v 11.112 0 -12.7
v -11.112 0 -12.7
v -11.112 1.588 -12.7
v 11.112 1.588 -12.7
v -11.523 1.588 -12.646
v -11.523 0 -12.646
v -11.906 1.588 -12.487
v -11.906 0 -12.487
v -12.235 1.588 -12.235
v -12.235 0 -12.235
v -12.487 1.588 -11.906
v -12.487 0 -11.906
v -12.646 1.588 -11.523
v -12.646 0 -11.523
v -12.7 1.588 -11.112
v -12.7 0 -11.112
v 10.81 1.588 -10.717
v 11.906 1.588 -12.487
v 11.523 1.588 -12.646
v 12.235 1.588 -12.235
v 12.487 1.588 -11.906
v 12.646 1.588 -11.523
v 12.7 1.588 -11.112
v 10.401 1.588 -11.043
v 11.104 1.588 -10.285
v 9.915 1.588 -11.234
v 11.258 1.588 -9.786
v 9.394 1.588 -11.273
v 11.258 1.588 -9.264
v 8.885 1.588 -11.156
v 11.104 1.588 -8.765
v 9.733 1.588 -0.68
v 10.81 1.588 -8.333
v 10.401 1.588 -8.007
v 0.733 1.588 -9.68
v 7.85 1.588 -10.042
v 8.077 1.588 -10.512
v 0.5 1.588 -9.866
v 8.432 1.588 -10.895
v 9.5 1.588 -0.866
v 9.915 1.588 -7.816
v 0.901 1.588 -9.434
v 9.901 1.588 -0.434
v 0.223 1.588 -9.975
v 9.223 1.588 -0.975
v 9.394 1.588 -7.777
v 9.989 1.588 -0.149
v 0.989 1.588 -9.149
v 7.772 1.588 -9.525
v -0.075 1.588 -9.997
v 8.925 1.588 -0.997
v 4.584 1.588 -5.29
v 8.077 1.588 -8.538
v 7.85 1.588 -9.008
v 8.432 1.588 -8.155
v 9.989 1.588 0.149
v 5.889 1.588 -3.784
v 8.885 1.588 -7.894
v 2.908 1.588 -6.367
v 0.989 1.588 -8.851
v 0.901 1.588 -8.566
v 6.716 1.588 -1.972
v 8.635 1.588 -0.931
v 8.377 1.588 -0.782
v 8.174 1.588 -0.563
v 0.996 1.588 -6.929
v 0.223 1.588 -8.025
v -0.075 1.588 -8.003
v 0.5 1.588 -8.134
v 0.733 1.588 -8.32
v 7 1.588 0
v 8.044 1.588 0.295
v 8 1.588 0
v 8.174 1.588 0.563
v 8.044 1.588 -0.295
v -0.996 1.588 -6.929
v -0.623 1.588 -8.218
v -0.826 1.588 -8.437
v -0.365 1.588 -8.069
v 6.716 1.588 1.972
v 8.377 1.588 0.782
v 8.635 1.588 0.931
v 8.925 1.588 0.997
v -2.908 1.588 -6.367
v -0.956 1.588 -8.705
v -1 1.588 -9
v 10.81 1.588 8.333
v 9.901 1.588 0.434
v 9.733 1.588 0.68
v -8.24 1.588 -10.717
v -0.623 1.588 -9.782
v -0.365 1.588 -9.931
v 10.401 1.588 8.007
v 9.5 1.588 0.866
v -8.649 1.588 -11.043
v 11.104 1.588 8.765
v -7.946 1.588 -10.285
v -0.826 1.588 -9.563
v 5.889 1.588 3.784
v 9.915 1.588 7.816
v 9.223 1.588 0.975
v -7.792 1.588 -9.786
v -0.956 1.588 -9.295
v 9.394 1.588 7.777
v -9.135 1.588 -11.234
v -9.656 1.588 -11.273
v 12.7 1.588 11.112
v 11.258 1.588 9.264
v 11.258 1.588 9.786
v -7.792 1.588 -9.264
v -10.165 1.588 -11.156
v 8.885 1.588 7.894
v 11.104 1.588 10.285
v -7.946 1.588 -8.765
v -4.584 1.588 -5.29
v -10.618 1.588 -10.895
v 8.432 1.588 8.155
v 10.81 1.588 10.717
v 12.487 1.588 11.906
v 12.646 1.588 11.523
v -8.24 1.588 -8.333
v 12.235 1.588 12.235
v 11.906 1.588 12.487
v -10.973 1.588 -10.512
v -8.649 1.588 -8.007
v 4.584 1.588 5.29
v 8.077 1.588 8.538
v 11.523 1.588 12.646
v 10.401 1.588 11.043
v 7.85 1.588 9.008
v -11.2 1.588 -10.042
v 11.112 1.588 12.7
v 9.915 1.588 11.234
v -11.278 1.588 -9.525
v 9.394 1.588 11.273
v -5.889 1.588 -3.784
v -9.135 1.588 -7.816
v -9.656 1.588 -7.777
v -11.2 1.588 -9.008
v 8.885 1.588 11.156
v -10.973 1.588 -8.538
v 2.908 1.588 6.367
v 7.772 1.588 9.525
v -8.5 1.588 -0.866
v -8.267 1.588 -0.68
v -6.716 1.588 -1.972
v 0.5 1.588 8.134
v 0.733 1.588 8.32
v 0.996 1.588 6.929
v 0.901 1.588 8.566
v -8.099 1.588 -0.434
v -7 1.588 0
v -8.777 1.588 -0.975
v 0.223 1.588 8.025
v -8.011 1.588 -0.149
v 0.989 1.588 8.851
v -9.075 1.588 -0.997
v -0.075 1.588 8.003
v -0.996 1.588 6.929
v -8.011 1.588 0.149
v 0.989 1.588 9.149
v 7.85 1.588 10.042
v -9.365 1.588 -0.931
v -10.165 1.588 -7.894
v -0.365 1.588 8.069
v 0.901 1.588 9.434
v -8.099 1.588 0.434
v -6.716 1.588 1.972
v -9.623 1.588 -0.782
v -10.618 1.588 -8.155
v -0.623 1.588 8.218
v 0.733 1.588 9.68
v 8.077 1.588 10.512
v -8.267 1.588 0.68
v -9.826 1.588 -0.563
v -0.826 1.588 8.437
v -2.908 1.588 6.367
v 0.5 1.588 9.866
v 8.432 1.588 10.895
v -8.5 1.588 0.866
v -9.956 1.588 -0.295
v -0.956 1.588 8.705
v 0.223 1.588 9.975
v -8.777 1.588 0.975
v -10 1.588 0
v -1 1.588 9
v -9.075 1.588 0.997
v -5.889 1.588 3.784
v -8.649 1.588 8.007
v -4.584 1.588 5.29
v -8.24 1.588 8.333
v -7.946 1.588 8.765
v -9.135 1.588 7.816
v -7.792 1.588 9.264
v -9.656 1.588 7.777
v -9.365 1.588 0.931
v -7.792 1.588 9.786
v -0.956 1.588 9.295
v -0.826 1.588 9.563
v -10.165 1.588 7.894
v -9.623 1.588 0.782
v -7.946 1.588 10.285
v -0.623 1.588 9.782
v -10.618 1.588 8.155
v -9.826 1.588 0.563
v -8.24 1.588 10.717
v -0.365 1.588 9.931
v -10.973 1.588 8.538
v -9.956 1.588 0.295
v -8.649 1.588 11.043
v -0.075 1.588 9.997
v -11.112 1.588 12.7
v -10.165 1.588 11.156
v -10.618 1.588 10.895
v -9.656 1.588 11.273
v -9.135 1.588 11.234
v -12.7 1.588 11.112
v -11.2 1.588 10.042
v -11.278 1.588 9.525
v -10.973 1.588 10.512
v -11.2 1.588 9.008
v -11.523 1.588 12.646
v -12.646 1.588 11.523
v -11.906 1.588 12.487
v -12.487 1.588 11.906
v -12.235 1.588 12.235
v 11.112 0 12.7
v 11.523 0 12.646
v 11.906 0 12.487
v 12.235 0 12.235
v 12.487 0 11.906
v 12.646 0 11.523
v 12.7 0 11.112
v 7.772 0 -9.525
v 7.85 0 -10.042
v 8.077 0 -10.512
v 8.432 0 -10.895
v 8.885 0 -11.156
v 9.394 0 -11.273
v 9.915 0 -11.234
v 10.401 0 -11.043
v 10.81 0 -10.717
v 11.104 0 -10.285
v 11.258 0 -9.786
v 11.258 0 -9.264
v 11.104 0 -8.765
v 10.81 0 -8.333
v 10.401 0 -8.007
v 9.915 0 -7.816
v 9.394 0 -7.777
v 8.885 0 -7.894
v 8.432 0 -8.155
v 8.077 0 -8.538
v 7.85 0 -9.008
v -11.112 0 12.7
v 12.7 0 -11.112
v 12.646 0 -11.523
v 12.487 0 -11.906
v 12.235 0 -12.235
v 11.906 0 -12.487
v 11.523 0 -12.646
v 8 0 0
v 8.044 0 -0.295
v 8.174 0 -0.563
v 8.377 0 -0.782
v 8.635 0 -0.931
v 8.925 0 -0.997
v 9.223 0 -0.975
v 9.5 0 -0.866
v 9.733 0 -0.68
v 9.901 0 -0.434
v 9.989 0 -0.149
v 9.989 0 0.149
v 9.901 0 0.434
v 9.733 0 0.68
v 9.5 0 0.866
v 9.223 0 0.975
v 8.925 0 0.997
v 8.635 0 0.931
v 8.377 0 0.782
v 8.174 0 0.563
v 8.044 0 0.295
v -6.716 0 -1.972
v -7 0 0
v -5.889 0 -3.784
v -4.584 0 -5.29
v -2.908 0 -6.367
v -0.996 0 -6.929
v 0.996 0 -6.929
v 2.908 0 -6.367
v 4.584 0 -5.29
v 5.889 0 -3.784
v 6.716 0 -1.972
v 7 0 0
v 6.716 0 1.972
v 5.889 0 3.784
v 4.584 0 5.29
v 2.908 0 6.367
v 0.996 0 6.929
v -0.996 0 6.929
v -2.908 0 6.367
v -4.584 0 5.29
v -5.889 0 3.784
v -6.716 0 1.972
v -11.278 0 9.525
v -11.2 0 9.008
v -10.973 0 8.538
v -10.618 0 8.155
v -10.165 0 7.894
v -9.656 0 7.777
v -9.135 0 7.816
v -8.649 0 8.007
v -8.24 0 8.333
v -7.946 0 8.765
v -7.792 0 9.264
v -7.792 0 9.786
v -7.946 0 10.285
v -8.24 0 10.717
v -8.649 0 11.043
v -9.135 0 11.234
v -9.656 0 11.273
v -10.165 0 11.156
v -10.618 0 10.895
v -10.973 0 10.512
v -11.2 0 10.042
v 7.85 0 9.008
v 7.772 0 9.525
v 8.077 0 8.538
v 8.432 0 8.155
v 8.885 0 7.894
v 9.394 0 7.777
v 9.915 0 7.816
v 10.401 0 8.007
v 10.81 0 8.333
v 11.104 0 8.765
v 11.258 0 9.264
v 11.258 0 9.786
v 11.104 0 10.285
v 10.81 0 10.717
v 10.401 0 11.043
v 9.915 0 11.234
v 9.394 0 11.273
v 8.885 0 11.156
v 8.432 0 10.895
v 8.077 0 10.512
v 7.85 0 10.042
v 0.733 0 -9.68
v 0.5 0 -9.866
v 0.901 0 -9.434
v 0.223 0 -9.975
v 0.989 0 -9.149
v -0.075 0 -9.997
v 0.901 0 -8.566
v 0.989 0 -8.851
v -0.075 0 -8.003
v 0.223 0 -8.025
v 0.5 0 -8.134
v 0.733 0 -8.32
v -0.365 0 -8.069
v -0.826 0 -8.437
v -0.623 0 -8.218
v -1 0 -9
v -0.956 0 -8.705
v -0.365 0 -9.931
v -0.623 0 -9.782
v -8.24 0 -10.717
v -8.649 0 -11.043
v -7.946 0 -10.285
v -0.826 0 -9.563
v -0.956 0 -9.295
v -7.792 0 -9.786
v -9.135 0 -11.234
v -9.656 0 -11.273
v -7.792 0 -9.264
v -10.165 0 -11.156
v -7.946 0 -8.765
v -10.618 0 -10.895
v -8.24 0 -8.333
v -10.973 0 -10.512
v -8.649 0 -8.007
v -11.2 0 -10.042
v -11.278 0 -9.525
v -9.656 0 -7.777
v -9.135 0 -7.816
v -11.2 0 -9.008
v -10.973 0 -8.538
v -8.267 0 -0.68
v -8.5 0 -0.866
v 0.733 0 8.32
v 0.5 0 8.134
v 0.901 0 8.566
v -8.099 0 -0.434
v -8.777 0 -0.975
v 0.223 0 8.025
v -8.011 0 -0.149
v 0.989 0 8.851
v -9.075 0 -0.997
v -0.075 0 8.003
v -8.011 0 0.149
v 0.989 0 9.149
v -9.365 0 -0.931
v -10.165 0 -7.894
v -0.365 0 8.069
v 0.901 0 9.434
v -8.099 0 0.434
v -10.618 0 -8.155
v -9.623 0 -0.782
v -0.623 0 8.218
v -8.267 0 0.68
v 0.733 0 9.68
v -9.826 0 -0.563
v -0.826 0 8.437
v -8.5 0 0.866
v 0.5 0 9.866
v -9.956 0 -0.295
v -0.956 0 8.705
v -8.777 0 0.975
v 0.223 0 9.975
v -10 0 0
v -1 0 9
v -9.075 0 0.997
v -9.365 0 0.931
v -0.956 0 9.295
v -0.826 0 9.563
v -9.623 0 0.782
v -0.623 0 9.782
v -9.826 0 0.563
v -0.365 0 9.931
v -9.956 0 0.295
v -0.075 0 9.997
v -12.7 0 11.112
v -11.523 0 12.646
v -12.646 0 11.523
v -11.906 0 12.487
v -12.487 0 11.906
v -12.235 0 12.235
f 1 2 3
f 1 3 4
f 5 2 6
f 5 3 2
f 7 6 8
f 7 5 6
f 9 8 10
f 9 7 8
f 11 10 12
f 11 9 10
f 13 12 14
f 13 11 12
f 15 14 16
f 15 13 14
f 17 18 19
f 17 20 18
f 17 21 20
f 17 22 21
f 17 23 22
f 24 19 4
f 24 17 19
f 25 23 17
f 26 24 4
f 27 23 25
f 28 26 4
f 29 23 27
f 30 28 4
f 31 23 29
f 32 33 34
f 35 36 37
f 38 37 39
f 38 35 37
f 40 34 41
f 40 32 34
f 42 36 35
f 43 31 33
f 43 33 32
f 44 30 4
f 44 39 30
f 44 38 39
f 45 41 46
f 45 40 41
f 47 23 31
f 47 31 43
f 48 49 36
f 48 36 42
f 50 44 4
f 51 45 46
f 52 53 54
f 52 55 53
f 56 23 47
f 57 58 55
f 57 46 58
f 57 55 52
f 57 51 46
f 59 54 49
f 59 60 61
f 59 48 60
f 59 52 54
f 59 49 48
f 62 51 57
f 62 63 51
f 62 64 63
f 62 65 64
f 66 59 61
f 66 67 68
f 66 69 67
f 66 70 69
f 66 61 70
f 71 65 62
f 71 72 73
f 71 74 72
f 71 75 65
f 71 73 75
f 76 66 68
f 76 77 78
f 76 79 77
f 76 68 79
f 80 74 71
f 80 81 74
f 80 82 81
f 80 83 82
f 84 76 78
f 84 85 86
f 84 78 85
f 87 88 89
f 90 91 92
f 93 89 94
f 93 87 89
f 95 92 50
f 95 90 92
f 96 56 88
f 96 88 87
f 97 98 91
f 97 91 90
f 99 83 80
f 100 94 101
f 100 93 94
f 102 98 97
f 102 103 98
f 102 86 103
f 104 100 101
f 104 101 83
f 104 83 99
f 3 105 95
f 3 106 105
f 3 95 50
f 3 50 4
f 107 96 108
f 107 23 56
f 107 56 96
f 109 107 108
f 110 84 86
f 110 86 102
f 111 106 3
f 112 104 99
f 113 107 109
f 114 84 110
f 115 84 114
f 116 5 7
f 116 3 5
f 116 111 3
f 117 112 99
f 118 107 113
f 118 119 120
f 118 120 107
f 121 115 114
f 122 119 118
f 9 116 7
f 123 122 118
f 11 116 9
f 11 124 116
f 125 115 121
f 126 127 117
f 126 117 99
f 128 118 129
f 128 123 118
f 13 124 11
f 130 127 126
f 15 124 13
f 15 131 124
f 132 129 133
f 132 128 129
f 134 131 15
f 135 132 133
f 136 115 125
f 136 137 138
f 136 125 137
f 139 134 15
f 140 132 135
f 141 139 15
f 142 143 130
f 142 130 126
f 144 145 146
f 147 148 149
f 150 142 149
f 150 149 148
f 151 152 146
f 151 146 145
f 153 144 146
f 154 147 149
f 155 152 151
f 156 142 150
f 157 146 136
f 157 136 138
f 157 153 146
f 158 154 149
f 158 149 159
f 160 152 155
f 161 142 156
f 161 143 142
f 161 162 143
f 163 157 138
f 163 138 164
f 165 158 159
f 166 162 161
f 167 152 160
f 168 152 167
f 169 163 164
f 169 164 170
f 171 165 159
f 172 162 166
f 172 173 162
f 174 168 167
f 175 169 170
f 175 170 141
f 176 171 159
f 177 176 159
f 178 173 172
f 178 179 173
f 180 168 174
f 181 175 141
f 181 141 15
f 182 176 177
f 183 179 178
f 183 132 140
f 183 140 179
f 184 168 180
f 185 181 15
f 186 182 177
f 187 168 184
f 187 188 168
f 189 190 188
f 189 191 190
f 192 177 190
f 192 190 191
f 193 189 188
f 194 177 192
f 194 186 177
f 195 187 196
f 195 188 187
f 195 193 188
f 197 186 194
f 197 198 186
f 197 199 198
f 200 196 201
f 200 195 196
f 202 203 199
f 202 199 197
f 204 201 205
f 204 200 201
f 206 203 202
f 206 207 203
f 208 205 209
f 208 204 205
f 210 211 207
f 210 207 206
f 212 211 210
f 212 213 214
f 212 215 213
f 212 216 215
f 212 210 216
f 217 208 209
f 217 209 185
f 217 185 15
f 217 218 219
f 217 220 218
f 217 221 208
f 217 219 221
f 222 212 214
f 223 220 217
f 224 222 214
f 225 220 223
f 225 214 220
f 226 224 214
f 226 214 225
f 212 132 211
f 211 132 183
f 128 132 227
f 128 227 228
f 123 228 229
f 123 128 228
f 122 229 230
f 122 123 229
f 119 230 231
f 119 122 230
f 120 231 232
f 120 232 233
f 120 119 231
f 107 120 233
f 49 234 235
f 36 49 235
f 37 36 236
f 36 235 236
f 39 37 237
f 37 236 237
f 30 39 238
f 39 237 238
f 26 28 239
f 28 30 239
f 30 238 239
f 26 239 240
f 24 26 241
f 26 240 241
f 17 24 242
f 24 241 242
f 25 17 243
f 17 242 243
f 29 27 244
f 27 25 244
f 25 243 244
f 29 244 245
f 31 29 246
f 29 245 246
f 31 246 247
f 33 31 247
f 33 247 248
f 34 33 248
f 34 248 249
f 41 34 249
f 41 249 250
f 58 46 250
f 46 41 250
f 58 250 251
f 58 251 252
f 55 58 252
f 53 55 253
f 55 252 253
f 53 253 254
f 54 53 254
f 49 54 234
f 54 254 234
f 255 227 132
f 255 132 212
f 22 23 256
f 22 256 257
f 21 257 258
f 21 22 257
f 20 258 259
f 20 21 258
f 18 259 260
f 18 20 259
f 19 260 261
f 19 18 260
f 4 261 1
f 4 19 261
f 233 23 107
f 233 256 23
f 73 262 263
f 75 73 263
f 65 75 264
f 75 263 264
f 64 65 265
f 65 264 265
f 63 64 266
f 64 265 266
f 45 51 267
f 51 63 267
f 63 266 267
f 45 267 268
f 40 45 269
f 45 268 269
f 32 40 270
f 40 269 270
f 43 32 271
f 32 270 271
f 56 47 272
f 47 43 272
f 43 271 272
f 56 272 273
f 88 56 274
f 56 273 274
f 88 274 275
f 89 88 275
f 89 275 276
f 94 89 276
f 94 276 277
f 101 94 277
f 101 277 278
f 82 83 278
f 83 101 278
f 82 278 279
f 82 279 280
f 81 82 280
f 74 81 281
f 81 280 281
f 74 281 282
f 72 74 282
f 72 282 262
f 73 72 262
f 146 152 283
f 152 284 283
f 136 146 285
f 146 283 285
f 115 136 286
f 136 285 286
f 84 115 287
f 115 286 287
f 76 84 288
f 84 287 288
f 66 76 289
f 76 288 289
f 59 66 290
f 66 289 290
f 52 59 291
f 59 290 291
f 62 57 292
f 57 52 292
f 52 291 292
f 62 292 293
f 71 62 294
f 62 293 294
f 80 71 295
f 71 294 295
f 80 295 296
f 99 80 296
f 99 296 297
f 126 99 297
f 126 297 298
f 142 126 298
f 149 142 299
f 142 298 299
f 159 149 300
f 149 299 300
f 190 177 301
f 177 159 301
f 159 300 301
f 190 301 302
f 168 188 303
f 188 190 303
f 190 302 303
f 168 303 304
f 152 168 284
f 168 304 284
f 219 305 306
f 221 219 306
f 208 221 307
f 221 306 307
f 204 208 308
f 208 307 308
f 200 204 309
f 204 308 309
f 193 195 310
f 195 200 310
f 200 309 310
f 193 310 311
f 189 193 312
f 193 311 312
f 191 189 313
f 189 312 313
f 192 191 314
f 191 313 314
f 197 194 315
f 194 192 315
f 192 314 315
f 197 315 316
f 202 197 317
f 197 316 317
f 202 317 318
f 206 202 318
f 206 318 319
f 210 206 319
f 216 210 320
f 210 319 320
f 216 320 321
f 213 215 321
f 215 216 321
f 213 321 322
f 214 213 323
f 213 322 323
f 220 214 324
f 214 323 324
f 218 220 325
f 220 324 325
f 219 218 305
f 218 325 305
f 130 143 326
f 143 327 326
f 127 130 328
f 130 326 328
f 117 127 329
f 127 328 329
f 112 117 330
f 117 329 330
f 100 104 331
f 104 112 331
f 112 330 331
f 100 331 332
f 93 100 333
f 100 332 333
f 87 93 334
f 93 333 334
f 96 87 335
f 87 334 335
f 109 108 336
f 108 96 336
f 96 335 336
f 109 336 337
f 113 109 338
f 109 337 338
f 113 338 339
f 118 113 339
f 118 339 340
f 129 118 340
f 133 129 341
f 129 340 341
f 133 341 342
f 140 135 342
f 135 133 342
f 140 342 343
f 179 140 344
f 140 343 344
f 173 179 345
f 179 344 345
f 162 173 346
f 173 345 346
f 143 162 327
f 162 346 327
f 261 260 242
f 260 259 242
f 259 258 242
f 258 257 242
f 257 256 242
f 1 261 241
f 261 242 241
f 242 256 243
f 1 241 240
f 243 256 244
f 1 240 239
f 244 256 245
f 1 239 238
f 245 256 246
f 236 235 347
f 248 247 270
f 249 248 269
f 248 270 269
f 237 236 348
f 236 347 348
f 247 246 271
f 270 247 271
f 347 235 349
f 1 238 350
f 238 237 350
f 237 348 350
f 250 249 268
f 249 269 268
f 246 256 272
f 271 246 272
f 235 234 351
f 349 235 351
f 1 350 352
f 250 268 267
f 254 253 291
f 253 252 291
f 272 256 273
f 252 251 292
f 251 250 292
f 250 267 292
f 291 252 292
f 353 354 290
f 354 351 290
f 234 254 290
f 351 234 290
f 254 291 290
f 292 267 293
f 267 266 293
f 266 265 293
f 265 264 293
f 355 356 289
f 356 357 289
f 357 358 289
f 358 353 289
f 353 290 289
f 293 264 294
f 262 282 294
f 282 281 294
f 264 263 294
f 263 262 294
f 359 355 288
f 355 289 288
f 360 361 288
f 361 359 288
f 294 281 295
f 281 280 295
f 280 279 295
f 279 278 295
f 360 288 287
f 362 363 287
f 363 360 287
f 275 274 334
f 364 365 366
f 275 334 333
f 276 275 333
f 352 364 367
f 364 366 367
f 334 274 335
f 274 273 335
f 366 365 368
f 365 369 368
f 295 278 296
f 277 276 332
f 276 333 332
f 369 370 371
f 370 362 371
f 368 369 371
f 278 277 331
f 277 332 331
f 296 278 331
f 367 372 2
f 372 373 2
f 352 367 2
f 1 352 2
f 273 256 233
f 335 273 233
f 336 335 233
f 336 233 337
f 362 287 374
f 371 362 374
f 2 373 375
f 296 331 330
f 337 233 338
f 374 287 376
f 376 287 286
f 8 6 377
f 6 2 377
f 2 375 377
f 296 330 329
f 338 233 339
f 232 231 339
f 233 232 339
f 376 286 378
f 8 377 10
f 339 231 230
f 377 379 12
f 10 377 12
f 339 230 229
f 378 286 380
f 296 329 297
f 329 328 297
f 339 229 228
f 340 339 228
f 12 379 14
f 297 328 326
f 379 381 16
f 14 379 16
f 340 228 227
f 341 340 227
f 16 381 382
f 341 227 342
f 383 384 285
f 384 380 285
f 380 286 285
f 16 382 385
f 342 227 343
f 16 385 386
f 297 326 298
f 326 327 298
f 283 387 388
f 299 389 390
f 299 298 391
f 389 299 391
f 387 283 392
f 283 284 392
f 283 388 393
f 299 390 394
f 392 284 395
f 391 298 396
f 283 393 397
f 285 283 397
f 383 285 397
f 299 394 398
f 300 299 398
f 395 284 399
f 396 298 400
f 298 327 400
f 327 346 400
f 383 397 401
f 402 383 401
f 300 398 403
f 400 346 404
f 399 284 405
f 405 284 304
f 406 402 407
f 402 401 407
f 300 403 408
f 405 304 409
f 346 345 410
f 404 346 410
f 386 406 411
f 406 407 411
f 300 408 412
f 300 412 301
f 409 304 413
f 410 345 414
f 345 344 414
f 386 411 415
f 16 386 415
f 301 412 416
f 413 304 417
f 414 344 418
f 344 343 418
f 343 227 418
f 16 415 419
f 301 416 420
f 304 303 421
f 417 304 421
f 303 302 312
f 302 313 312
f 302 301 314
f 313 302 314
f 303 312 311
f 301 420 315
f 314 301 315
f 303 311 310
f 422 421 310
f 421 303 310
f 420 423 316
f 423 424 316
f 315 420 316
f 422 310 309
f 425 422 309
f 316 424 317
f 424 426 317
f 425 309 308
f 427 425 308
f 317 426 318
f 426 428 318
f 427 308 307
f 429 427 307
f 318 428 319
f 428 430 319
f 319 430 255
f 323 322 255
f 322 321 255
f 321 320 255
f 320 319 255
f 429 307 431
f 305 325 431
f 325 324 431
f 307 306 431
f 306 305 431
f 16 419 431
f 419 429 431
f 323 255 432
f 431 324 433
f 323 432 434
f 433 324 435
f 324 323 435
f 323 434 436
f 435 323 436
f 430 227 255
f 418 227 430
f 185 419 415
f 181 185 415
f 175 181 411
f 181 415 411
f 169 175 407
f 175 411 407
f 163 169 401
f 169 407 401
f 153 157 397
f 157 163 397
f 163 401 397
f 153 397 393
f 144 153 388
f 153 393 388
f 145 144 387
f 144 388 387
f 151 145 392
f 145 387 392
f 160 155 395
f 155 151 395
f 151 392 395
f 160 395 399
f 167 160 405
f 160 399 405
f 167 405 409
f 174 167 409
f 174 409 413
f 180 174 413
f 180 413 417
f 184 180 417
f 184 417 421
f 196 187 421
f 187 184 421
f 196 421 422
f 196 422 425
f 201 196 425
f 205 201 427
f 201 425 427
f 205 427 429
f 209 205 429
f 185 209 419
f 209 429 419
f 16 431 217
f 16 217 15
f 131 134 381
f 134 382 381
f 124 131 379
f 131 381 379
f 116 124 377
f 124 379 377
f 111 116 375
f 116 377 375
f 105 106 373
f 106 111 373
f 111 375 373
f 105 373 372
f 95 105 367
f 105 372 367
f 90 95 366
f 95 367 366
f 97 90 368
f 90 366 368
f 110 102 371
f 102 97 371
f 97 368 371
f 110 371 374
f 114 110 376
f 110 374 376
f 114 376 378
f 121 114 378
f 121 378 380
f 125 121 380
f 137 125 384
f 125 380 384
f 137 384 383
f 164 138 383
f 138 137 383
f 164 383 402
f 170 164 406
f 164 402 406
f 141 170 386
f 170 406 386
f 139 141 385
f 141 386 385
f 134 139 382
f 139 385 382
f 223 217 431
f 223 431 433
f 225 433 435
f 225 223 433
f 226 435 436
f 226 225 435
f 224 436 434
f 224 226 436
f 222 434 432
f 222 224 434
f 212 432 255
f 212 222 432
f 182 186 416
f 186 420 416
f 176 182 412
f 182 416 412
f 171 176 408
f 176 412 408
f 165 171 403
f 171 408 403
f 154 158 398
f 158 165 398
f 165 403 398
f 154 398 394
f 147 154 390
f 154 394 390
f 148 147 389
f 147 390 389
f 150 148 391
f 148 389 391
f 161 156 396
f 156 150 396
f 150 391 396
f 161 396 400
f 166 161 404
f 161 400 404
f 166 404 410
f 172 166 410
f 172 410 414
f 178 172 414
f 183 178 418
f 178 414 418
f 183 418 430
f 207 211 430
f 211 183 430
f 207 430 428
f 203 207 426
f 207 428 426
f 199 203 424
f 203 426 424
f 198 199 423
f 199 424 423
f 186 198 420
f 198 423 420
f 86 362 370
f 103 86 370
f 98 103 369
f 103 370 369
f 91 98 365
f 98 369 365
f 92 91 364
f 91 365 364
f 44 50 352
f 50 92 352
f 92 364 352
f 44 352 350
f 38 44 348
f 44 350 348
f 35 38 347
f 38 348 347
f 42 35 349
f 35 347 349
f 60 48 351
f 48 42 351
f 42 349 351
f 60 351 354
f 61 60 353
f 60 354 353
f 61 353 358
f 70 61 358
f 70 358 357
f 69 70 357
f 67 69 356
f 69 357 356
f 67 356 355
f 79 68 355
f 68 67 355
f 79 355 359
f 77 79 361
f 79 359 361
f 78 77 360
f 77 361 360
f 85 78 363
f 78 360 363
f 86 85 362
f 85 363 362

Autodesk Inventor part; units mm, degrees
ref_plane "YZ Plane" through (0, 0, 0) normal (1, 0, 0) x (0, 1, 0)
ref_plane "XZ Plane" through (0, 0, 0) normal (0, 1, 0) x (-1, 0, 0)
ref_plane "XY Plane" through (0, 0, 0) normal (0, 0, 1) x (1, 0, 0)
sketch "Sketch1" plane through (0, 0, 0) normal (0, 1, 0) x (-1, 0, 0)
  line L0 (-12.7, 12.7) -> (12.7, 12.7)
  line L1 (12.7, 12.7) -> (12.7, -12.7)
  line L2 (12.7, -12.7) -> (-12.7, -12.7)
  line L3 (-12.7, -12.7) -> (-12.7, 12.7)
  line L4 (-12.7, 12.7) -> (12.7, -12.7) construction
  line L5 (12.7, 12.7) -> (-12.7, -12.7) construction
  line L6 (-9.525, 9.525) -> (9.525, 9.525) construction
  line L7 (9.525, 9.525) -> (9.525, -9.525) construction
  line L8 (9.525, -9.525) -> (-9.525, -9.525) construction
  line L9 (-9.525, -9.525) -> (-9.525, 9.525) construction
  line L10 (-9.525, 9.525) -> (9.525, -9.525) construction
  line L11 (9.525, 9.525) -> (-9.525, -9.525) construction
  circle A0 centre (9.525, 9.525) radius 1.7526
  circle A1 centre (-9.525, 9.525) radius 1.7526
  circle A2 centre (-9.525, -9.525) radius 1.7526
  circle A3 centre (9.525, -9.525) radius 1.7526
  circle A4 centre (0, 0) radius 7
  circle A5 centre (0, 0) radius 9 construction
  line L12 (9, 0) -> (0, 0) construction
  circle A6 centre (9, 0) radius 1
  circle A7 centre (0, 9) radius 1
  circle A8 centre (-9, 0) radius 1
  circle A9 centre (0, -9) radius 1
  dimension "d10" = 18
  dimension "d0" = 25.4
  dimension "d1" = 25.4
  dimension "d2" = 19.05
  dimension "d3" = 19.05
  dimension "d4" = 3.5052
  dimension "d7" = 360
  dimension "d9" = 14
  dimension "d11" = 2
  dimension "d14" = 360
extrude "Extrusion1" add sketch "Sketch1" along normal blind 1.5875
fillet "Fillet1" radius 1.5875 4 edges at (-12.7, 0.7937, 12.7) (12.7, 0.7937, 12.7) (-12.7, 0.7937, -12.7) (12.7, 0.7937, -12.7)
properties part number "Drive Plate"
